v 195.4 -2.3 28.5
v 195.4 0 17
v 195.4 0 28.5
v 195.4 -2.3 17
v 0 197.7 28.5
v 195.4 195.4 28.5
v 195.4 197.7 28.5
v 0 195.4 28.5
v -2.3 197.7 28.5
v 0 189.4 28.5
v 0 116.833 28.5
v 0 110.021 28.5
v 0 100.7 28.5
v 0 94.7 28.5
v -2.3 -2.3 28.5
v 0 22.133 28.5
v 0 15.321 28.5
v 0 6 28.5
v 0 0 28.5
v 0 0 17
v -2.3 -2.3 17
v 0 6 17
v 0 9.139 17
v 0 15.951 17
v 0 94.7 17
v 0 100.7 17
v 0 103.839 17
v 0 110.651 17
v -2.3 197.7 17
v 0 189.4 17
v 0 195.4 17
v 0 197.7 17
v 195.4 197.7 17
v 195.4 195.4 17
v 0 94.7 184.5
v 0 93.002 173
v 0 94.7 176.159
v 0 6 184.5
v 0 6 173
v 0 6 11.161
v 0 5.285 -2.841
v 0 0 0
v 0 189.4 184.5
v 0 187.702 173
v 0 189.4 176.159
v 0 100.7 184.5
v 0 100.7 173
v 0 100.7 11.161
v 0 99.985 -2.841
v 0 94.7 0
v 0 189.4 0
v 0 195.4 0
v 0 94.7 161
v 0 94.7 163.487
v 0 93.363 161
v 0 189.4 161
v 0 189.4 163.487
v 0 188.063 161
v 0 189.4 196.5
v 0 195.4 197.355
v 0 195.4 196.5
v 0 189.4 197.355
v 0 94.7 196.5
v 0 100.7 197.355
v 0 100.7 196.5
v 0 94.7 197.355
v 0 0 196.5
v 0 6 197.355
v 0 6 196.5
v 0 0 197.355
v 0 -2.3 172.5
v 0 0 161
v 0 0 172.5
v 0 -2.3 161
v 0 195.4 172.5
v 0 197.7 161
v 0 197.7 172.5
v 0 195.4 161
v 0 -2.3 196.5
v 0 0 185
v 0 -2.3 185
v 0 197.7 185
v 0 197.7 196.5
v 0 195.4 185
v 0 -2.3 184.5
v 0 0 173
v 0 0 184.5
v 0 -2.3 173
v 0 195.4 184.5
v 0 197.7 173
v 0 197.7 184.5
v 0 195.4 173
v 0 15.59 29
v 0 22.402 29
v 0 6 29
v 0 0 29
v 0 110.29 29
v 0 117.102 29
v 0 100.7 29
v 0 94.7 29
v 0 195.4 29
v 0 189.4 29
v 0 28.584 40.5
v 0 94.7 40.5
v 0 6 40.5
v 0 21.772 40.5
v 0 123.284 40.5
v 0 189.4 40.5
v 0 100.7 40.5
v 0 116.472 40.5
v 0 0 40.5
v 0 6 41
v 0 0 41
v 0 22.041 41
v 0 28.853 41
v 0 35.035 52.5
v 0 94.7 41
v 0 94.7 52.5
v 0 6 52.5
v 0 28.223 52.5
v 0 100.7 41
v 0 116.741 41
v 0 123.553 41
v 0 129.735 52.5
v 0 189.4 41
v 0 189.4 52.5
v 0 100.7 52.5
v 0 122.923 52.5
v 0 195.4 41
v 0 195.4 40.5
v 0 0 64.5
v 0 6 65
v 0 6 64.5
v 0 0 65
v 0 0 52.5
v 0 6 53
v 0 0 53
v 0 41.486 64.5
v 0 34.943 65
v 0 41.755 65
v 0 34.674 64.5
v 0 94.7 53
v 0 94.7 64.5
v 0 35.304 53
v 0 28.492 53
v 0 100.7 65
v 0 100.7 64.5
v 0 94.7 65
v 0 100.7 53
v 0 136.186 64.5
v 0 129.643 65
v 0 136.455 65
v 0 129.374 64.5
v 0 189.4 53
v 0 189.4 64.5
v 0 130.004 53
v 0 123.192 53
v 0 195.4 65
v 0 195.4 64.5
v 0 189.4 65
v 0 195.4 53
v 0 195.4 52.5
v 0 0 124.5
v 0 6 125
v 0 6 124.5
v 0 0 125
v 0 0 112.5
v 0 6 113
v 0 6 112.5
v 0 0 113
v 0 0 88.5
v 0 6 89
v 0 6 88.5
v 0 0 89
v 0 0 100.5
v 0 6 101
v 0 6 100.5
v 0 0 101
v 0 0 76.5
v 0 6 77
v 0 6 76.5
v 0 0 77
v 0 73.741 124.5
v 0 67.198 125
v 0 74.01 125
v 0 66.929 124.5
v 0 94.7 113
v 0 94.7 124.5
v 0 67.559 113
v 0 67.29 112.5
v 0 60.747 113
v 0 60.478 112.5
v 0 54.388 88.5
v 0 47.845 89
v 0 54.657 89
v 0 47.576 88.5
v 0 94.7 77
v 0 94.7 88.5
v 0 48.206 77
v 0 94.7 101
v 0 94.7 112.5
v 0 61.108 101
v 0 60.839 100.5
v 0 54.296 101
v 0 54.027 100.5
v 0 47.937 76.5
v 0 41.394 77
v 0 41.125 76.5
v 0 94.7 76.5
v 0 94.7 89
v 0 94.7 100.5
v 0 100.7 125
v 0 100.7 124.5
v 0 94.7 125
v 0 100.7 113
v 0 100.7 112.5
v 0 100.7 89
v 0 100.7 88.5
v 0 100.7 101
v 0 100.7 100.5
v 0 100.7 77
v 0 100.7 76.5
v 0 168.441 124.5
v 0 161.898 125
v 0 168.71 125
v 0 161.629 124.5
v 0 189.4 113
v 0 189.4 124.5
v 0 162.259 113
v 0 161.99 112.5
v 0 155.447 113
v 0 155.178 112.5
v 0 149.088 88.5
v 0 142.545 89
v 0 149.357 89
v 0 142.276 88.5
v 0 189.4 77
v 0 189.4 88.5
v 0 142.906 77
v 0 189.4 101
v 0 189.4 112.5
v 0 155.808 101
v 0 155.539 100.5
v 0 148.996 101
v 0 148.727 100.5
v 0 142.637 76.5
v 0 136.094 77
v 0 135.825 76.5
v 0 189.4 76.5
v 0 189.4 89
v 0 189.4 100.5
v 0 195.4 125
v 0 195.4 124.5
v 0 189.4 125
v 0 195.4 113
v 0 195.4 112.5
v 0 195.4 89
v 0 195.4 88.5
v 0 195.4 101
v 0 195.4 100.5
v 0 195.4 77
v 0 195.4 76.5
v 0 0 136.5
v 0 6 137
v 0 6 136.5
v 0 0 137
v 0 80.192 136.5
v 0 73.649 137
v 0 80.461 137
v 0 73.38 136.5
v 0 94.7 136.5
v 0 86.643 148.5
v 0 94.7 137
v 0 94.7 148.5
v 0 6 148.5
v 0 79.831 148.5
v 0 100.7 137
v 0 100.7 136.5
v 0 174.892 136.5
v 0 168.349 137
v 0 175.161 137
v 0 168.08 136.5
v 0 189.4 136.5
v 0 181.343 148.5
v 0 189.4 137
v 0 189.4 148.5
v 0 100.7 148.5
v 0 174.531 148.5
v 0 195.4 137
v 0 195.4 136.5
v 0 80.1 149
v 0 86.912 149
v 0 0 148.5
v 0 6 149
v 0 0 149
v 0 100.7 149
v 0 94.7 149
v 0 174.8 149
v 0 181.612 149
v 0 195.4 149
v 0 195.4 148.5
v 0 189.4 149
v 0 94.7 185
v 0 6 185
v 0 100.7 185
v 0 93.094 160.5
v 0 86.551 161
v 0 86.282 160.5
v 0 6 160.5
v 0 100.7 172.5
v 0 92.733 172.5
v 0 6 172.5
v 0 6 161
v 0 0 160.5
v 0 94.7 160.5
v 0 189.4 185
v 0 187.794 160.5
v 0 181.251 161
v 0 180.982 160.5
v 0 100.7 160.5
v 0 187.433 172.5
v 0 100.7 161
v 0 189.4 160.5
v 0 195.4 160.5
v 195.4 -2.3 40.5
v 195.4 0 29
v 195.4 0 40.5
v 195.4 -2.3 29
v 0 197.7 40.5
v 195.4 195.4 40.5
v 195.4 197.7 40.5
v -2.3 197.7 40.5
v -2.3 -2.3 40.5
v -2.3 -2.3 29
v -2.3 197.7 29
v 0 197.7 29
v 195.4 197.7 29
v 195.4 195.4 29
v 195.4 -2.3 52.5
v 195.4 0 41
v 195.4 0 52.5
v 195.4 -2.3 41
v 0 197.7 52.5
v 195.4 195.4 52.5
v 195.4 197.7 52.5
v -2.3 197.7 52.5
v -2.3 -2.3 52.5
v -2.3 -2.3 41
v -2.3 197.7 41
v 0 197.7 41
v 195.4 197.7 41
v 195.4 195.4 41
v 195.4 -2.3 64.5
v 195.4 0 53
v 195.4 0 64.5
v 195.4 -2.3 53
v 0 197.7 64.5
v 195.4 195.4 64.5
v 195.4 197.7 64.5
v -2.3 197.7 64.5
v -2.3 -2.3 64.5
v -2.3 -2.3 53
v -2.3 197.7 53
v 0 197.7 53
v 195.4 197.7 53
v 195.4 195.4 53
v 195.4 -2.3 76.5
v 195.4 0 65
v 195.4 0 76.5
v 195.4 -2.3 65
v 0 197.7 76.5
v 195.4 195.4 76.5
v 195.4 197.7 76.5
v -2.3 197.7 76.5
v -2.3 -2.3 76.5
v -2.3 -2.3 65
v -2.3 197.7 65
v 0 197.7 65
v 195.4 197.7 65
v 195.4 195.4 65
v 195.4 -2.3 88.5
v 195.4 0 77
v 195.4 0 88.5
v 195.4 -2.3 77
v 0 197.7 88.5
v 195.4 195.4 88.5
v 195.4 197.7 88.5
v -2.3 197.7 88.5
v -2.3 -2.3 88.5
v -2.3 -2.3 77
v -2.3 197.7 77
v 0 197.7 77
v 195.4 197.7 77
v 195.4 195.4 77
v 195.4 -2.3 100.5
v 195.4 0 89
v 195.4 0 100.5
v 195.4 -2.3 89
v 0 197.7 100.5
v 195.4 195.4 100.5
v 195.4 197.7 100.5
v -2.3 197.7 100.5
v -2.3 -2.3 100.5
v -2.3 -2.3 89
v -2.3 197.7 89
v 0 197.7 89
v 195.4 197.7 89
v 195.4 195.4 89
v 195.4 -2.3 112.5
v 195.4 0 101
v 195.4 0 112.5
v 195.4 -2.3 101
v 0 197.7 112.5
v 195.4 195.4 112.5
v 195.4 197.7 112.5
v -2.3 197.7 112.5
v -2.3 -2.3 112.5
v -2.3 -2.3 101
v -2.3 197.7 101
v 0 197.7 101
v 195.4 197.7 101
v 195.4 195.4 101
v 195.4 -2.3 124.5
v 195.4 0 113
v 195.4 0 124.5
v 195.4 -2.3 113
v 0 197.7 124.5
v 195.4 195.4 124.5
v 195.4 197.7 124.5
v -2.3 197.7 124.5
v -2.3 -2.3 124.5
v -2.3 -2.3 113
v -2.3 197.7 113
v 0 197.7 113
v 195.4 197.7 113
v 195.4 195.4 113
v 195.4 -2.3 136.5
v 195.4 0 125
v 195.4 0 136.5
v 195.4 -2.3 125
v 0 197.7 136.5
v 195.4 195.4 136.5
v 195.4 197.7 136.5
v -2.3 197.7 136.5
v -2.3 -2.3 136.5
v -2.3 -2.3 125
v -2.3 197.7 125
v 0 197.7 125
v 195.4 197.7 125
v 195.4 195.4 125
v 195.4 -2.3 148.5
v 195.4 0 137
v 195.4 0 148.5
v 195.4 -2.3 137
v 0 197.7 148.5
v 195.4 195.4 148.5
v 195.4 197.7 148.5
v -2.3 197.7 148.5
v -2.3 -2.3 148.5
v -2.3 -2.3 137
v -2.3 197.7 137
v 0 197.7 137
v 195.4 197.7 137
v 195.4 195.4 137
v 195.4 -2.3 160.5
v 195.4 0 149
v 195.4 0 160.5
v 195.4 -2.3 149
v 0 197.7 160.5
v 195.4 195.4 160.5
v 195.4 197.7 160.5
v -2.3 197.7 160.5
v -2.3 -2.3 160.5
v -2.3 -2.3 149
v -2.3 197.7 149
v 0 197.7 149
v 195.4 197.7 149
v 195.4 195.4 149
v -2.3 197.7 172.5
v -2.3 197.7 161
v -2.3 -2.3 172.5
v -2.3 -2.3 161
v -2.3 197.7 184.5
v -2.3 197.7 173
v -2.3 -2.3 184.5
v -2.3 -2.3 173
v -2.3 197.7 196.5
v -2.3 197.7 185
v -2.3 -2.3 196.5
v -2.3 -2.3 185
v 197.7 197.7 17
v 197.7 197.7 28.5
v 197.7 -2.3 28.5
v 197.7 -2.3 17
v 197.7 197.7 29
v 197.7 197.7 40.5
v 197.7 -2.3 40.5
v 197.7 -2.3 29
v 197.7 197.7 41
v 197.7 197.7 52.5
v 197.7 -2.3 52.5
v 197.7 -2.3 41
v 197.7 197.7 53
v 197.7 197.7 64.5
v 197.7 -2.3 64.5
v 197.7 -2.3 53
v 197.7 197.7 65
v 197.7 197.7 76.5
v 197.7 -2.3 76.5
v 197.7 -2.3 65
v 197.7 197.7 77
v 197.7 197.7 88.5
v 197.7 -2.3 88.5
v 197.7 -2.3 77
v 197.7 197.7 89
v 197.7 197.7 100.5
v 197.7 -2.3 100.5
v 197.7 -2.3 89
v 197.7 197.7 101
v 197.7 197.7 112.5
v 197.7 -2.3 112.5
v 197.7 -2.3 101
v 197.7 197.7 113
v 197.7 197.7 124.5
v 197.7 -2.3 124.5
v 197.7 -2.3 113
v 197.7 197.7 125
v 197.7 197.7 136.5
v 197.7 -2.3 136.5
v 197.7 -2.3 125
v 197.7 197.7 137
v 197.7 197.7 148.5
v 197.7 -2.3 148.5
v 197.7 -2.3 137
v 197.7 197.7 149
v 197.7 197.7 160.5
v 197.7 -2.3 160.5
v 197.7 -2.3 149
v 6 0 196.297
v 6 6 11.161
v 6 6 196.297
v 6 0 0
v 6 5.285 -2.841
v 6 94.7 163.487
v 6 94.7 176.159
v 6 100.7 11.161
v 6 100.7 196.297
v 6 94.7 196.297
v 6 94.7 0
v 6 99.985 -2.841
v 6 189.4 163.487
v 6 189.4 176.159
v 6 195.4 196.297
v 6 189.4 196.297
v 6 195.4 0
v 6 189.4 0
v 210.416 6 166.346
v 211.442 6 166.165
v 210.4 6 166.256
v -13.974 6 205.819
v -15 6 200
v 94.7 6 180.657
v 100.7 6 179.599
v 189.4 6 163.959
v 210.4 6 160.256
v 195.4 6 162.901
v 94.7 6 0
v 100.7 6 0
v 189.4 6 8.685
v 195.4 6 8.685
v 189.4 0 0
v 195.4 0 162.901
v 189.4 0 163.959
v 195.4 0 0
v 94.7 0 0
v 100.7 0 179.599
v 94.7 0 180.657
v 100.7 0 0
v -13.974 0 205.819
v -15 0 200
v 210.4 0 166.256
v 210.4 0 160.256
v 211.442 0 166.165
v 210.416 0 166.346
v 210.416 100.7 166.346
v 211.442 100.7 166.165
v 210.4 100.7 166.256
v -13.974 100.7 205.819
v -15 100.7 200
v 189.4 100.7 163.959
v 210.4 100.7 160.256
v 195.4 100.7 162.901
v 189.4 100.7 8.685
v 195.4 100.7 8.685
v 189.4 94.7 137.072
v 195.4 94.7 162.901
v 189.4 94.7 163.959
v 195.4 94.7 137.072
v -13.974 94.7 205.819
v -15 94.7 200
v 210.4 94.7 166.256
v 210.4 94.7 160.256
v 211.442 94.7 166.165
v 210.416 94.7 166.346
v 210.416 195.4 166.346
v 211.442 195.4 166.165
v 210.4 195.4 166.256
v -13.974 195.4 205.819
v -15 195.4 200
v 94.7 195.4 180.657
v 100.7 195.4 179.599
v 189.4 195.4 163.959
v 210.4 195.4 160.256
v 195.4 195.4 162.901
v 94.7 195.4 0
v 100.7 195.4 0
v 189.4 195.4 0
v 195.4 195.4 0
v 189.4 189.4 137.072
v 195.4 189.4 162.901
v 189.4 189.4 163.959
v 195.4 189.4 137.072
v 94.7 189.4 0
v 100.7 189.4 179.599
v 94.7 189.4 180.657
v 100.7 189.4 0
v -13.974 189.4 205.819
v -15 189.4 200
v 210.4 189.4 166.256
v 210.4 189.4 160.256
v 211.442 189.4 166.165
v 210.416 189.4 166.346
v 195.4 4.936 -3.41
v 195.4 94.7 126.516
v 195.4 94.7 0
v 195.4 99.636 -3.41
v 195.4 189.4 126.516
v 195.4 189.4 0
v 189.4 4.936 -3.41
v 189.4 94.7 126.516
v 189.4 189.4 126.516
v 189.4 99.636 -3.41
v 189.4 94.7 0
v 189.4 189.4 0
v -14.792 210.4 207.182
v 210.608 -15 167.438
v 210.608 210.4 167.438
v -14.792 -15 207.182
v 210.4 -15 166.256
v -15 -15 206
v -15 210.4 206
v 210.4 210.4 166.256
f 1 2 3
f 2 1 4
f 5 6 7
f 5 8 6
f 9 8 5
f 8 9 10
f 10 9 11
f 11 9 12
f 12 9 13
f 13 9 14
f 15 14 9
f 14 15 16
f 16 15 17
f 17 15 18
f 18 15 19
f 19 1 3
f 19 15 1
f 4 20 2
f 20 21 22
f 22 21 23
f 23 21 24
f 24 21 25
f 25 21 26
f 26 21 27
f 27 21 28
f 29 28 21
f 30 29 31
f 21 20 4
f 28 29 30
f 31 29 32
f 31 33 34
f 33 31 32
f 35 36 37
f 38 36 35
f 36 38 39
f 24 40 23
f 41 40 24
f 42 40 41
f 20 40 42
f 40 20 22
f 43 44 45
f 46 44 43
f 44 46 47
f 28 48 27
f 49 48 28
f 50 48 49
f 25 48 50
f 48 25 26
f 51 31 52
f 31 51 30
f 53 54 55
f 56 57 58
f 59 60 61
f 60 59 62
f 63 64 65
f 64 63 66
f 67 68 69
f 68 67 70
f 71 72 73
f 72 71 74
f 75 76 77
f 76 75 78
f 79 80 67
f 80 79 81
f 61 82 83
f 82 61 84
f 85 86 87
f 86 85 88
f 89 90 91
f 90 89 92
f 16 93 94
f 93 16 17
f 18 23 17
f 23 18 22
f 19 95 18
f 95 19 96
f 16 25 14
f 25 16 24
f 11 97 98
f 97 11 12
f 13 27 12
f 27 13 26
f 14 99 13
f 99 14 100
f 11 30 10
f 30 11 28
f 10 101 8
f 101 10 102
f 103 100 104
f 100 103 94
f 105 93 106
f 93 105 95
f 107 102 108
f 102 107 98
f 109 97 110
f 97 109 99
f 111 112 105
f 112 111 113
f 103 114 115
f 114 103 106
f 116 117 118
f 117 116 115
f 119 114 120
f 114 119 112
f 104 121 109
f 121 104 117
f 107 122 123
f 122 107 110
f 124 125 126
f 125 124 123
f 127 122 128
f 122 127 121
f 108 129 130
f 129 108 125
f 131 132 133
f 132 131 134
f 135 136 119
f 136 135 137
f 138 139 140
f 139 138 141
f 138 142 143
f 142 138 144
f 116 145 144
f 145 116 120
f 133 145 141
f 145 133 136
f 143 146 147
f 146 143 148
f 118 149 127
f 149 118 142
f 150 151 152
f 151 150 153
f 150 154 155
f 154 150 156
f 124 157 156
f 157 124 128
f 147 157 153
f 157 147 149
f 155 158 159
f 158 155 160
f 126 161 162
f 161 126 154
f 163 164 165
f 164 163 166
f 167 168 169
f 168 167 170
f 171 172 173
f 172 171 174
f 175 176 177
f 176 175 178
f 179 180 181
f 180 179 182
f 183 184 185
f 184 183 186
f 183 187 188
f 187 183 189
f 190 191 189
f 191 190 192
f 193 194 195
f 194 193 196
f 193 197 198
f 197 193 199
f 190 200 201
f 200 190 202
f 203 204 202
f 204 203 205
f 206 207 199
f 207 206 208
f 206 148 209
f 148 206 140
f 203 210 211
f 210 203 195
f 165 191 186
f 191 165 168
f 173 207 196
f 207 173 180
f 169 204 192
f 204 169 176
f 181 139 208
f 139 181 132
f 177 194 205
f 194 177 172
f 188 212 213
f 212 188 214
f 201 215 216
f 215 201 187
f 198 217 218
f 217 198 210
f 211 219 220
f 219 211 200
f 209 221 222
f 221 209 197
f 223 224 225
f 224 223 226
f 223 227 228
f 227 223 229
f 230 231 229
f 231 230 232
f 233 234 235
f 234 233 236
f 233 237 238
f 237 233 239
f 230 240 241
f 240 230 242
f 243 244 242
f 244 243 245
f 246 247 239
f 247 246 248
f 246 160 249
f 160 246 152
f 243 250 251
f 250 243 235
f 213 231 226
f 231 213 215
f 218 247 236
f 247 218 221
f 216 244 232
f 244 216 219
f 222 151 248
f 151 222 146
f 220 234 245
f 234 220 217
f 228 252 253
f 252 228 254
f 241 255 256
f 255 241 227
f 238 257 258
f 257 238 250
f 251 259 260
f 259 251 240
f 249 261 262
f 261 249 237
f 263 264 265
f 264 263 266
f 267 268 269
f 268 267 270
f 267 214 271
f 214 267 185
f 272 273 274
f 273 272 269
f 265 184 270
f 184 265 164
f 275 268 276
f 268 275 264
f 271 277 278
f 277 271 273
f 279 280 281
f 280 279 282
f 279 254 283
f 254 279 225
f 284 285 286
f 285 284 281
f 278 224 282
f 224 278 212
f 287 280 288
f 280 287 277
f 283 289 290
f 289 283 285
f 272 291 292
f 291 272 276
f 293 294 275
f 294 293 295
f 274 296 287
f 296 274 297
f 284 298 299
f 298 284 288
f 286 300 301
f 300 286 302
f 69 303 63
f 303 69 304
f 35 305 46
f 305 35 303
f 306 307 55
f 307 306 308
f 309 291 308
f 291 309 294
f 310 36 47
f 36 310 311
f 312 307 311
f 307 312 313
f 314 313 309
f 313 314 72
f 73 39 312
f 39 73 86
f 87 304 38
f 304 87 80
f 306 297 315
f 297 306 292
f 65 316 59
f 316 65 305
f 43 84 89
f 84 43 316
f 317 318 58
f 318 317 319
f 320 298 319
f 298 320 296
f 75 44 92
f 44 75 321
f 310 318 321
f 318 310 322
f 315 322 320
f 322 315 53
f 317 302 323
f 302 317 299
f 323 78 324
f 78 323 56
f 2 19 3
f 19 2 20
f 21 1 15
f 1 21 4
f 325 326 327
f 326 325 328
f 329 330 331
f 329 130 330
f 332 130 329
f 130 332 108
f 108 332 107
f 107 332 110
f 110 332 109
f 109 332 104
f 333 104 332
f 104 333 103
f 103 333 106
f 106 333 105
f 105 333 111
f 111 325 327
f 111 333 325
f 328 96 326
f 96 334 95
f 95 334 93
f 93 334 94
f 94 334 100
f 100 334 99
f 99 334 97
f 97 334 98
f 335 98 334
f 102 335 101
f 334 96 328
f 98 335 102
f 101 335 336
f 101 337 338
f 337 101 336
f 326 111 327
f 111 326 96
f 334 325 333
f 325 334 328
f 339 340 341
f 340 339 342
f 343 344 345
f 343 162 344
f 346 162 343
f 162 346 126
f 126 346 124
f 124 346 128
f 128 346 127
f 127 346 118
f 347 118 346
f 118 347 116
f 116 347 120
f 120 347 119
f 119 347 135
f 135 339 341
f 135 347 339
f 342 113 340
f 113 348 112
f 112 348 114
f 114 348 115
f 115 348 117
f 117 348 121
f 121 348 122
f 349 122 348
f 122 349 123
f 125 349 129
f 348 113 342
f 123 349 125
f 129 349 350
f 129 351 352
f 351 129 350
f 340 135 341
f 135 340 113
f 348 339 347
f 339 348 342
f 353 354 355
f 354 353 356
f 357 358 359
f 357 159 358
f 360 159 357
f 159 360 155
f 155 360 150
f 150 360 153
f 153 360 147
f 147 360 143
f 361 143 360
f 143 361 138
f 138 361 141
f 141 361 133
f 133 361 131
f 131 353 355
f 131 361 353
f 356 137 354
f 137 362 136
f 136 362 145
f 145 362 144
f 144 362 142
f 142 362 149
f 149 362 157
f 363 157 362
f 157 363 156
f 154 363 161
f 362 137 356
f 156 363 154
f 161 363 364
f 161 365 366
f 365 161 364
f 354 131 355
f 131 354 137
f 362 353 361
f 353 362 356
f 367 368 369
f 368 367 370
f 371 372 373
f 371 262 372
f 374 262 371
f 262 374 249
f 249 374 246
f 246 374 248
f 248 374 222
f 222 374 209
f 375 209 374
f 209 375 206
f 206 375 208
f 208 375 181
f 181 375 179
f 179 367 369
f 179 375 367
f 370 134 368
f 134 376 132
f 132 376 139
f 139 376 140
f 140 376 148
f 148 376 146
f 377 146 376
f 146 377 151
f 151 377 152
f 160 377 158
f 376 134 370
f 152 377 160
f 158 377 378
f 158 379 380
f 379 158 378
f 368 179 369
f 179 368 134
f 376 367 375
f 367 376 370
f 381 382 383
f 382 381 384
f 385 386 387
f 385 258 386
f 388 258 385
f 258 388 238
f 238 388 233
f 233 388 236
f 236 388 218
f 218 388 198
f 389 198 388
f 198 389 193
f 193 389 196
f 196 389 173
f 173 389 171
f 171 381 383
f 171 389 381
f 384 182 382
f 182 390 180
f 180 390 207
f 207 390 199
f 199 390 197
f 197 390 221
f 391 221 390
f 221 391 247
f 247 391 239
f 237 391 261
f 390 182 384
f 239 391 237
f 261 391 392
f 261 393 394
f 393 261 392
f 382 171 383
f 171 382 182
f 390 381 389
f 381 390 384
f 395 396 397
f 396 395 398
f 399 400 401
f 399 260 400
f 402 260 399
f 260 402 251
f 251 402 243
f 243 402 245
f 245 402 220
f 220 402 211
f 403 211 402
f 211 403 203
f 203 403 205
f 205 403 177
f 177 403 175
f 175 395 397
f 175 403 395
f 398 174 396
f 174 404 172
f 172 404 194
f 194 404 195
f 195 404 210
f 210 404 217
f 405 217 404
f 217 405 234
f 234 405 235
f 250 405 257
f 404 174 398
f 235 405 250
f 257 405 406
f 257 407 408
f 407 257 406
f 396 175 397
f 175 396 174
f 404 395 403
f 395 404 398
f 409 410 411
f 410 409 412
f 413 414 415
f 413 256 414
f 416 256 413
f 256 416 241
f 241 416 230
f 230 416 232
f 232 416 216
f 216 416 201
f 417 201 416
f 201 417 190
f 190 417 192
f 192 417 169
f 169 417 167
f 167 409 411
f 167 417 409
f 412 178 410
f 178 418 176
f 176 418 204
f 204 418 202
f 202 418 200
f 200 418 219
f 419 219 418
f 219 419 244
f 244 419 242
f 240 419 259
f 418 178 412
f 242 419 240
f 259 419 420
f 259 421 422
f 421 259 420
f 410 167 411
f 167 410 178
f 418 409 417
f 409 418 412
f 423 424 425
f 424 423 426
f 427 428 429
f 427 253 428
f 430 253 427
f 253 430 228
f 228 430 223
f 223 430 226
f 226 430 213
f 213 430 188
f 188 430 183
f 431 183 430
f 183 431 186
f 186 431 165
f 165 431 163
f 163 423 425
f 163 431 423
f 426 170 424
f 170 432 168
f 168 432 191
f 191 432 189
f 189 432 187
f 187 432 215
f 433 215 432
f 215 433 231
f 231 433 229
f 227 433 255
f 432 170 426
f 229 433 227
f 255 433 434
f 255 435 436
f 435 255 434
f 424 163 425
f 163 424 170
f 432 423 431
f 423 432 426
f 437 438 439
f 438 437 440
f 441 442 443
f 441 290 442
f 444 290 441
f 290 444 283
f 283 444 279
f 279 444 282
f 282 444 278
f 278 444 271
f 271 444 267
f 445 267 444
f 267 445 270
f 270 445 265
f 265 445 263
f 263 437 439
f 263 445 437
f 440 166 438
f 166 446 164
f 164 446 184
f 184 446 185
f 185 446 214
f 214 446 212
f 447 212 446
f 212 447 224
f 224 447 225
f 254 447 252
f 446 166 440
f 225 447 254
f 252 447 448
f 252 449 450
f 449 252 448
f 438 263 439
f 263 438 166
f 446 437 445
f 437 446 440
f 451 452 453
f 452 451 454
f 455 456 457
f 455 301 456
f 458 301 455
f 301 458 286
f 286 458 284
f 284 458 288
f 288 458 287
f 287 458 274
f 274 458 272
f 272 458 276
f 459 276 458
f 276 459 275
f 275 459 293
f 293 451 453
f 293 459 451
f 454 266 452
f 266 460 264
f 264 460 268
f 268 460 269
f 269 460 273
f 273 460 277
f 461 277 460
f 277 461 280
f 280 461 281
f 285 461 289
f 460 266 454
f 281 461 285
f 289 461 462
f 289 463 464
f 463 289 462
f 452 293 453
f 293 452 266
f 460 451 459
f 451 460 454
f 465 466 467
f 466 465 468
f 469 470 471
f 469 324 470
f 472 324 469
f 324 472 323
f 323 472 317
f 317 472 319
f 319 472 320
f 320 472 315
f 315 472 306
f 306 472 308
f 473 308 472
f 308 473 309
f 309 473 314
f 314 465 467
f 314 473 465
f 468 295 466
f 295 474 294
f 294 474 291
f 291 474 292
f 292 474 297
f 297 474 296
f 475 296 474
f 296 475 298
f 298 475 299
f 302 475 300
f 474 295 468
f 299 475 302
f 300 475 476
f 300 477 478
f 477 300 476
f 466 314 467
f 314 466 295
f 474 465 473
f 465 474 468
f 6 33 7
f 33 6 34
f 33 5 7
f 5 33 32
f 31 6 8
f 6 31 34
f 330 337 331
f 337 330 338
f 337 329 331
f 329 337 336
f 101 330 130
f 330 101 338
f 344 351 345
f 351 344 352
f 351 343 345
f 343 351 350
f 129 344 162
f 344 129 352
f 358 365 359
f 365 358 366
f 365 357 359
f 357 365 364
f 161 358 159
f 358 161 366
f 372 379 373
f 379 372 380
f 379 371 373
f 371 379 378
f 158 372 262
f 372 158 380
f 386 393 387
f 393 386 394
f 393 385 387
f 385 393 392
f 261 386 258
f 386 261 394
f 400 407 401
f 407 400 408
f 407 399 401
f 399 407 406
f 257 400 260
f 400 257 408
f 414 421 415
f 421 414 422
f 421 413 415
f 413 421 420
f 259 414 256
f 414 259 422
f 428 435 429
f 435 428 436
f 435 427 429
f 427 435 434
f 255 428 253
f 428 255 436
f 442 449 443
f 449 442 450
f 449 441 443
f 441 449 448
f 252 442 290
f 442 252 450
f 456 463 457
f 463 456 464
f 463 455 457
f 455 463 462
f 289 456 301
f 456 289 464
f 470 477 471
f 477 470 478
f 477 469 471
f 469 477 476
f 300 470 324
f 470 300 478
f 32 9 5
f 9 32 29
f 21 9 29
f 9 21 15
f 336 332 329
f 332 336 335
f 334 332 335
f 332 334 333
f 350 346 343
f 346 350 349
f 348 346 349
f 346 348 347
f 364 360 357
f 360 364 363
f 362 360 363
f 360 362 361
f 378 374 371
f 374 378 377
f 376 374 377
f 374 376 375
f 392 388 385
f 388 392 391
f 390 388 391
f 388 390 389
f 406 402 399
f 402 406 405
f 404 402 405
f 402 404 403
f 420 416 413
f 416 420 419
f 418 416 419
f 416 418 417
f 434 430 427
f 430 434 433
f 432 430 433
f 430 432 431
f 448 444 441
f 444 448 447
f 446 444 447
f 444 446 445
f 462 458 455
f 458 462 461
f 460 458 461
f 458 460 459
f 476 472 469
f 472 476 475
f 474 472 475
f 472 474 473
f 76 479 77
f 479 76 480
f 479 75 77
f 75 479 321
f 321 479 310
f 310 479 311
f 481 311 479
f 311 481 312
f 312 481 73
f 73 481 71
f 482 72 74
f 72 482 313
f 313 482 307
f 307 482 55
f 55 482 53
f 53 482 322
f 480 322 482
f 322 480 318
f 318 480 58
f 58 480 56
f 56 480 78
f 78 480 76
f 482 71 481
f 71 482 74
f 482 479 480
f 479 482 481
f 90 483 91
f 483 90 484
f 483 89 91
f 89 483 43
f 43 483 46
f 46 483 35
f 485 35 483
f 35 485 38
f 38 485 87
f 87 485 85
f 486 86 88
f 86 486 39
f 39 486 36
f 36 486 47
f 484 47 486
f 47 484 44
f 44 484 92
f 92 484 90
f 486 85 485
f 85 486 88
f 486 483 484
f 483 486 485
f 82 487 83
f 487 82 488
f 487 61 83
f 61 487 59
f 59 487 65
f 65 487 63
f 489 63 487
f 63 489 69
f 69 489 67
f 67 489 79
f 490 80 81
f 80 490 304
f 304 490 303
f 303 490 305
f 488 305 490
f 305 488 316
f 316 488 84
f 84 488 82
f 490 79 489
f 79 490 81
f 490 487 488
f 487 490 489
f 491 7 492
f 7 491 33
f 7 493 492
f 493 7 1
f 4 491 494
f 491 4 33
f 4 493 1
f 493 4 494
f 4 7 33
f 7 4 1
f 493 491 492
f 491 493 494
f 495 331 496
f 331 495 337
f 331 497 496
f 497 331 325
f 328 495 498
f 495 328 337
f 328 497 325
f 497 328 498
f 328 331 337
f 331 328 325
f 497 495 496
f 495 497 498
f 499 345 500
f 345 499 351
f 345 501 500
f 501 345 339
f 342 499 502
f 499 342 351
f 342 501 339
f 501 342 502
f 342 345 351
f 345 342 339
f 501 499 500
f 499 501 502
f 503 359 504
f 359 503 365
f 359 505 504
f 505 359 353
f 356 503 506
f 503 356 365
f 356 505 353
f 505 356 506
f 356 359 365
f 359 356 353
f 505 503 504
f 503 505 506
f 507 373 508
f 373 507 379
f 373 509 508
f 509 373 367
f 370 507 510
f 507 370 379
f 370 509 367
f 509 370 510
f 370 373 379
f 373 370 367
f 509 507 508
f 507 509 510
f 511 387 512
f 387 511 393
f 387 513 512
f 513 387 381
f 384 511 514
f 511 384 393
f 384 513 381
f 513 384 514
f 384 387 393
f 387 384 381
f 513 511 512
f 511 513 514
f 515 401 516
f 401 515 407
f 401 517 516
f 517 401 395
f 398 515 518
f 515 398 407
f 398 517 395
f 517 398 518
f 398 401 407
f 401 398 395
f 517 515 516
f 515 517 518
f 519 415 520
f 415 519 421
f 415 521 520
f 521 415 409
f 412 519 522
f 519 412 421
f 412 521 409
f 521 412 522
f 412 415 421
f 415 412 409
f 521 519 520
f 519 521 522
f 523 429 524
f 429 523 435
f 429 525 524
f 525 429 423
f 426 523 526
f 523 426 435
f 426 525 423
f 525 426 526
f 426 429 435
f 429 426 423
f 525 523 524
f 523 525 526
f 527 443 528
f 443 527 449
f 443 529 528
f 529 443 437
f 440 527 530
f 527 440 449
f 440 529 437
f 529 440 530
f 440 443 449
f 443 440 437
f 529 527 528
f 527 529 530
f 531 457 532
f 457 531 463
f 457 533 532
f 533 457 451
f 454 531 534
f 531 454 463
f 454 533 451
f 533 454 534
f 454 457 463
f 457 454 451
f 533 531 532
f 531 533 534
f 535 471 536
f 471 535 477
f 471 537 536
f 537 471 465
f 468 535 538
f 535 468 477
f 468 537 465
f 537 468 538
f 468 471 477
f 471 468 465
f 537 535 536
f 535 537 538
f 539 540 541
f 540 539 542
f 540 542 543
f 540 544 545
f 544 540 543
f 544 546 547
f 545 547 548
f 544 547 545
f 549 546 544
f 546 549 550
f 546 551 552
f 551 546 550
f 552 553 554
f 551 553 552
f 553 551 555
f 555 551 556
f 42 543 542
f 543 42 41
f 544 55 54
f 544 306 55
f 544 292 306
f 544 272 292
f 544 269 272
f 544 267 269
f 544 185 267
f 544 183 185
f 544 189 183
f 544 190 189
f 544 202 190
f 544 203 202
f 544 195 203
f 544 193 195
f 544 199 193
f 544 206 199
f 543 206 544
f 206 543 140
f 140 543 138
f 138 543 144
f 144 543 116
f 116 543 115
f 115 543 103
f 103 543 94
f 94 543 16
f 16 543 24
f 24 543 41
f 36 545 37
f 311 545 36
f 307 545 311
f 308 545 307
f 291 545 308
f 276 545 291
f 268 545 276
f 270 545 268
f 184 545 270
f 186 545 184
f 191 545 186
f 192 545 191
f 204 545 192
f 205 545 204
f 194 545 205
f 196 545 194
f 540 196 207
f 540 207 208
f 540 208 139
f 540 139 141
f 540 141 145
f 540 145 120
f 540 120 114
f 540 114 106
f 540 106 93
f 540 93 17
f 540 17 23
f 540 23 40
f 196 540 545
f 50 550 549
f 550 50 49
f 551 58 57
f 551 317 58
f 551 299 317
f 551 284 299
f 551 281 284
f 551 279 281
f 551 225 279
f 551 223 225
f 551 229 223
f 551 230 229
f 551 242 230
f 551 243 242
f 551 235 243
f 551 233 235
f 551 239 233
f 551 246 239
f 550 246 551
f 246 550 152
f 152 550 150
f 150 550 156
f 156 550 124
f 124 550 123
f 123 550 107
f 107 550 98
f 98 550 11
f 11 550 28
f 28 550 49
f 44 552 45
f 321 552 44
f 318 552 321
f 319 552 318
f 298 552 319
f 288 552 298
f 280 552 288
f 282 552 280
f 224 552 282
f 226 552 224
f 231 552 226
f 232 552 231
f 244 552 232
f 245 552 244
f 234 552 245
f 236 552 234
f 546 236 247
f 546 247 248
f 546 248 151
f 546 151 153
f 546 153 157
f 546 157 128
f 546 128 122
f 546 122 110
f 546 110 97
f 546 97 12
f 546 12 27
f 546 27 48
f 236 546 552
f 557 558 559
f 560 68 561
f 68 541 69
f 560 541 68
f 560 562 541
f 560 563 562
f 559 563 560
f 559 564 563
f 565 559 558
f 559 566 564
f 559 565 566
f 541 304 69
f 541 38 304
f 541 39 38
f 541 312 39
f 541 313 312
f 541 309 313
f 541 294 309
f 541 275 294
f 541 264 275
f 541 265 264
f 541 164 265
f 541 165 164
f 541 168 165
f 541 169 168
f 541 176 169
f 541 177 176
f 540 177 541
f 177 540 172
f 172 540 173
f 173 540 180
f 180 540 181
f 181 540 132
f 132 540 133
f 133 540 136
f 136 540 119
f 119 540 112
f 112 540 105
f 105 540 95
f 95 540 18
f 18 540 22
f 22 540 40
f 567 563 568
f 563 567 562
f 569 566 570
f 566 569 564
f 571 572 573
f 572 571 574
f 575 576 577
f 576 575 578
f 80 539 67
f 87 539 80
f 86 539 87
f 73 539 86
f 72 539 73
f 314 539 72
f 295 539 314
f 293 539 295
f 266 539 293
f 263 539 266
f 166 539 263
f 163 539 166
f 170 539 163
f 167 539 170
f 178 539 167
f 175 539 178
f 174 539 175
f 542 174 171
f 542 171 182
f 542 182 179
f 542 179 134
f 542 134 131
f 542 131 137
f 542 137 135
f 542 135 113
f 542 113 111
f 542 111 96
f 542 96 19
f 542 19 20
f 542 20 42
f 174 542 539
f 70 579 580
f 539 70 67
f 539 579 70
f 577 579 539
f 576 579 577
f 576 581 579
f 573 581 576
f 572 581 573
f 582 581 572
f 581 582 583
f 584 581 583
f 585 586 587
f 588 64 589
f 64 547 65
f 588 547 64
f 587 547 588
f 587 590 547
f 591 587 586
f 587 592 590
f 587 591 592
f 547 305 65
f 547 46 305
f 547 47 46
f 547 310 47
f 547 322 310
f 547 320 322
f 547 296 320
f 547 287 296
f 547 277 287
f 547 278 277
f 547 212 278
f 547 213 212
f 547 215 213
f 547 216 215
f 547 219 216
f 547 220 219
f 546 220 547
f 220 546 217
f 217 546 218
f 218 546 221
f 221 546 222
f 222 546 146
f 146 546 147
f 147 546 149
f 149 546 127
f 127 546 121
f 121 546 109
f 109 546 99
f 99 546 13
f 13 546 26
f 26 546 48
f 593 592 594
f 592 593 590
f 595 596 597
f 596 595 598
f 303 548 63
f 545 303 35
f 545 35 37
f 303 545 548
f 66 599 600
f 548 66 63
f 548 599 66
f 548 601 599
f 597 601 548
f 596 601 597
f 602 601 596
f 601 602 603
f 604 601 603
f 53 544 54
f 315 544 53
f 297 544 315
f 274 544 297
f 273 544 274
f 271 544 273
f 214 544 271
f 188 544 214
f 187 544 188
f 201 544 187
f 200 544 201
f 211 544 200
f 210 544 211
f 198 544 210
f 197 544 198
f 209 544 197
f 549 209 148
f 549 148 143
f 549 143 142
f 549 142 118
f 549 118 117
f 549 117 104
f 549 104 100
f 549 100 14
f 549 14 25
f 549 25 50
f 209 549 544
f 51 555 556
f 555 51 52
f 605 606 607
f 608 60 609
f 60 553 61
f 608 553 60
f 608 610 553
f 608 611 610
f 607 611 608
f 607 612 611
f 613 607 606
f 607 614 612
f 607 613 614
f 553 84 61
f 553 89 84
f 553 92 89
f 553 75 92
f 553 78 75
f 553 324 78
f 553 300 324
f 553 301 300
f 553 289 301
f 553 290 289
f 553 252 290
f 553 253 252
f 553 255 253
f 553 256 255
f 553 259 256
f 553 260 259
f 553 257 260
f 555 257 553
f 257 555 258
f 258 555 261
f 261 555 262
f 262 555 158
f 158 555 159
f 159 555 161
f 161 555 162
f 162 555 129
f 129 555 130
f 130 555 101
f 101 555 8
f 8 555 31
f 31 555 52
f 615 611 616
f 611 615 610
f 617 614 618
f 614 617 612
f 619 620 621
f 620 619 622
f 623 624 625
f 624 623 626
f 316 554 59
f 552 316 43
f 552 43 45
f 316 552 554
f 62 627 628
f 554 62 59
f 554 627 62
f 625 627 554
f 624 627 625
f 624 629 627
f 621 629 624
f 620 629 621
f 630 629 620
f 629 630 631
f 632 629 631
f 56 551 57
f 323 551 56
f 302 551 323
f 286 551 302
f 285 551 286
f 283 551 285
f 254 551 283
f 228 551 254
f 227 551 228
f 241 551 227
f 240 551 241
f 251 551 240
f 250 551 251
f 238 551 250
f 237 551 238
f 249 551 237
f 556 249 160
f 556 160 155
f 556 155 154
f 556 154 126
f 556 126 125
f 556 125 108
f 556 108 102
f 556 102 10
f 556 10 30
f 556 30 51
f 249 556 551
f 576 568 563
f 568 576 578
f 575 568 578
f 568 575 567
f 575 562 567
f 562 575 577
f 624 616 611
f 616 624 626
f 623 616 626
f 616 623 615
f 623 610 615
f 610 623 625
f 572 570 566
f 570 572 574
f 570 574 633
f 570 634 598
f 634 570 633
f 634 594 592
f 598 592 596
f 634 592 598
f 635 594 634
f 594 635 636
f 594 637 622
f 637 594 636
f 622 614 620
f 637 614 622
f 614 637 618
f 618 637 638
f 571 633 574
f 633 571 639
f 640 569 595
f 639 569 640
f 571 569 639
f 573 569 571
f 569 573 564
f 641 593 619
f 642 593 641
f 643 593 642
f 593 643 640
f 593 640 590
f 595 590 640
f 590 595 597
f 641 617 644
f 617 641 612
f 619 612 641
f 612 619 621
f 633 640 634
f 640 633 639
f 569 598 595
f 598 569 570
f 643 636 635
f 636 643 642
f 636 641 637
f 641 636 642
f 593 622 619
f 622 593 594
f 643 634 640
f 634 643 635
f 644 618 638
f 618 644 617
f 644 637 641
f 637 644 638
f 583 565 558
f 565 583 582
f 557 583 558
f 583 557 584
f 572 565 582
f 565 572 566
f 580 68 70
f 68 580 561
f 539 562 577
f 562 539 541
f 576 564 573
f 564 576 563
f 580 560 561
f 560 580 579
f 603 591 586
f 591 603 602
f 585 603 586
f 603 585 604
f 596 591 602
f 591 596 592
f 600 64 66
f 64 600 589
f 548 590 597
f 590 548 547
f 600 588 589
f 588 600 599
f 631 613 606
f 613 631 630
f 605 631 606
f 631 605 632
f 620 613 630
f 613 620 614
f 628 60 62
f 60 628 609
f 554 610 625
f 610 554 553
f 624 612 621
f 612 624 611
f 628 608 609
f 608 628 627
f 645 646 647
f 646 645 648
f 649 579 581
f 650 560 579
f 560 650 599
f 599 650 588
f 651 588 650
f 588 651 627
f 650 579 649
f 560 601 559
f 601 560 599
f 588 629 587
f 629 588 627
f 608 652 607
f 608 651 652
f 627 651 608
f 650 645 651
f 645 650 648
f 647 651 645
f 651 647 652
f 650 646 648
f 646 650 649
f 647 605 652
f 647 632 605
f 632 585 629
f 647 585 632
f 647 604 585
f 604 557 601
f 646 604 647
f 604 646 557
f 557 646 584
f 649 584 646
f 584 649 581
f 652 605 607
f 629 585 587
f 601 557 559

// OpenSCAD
height = 200;
depth = 195.4;
width = 195.4;

roofOverlap = 15;
roofAngle = 10;

beamCountWidth = 3;
beamCountDepth = 3;
beamWidth = 6;
beamDepth = 6;

boardHeight = 11.5;
boardThickness = 2.3;
boardSpacing = 0.5;

plateWidth = 62.5;
plateHeight = 1.2;

widthMinOne = width - beamWidth;
depthMinOne = depth - beamDepth;

beamSpacing = depthMinOne / (beamCountDepth - 1);

blankBeamBottomHeight = 17;

useActualWallHeight = true;

// einschlaghülse: 10.95€
// beam: 6.4€
// board: 5€
// coating: 81.95€
// roof plate: 9.67€
// price = 8 * 10.95 + 15 * 6.4 + 60 * 5 + 81.95 + 4 * 9.67 = 604.23



// beams
module beamRow(placeMiddle, beamHeight) {
    for(y = [0 : beamSpacing : depthMinOne]) {
        if(placeMiddle || y == 0 || y == depthMinOne) {
            echo("BEAM", beamWidth, beamDepth, beamHeight);
            translate([0, y, 0])
                cube([beamWidth, beamDepth, beamHeight]);
        }
    }
}
// diagonal beams for stability
module stabilityBeam(beamHeight) {
    for(y = [0 : beamSpacing : depthMinOne - 1]) {
        stabilityBeamAngle = -1 * asin(beamSpacing / beamHeight);
        echo("STABILITY BEAM", stabilityBeamAngle, beamHeight, beamDepth, beamWidth);
        translate([0, y, 0])
            rotate([stabilityBeamAngle, 0, 0])
                cube([beamDepth, beamWidth, beamHeight]);
    }
}
module beams() {
    for(x = [0 : beamSpacing : widthMinOne]) {
        beamHeight = height - x * tan(roofAngle);
        translate([x, 0, 0])
            union() {
                if(x == 0 || x == widthMinOne) {
                    stabilityBeam(beamHeight);
                }
                beamRow(x == 0 || x == widthMinOne, beamHeight);
            }
    }
}

module roof(enablePrint = false) {
    roofLength = (width + 2 * roofOverlap) / cos(roofAngle);

    // roof beams
    for(y = [0 : beamSpacing : depthMinOne]) {
        if(enablePrint) {
            echo("ROOF BEAM", roofLength, beamDepth, beamWidth);
        }
        translate([-roofOverlap, y, height])
            rotate([0, roofAngle, 0])
                cube([roofLength, beamDepth, beamWidth]);
    }

    // roof plates
    translate([-roofOverlap, -roofOverlap, height + beamWidth])
        rotate([0, roofAngle, 0])
            union() {
                for(x = [0 : plateWidth : roofLength]) {
                    actualWidth = x + plateWidth > roofLength ? roofLength - x : plateWidth;
                    if(enablePrint) {
                        echo("ROOF PLATE", actualWidth, depth + 2 * roofOverlap, plateHeight);
                    }
                    translate([x, 0, 0])
                        cube([actualWidth, depth + 2 * roofOverlap, plateHeight]);
                }
            }
}

//wall 
module wall(width, wallHeight) {
    usedWallHeight = useActualWallHeight ? wallHeight - boardHeight : height;
    for(z = [blankBeamBottomHeight : boardHeight + boardSpacing : usedWallHeight]) {
        echo("WALL BOARD", width, boardThickness, boardHeight);
        translate([0, 0, z])
            cube([width, boardThickness, boardHeight]);
    }
}

// all walls
union() {
    translate([0, -boardThickness, 0])
        wall(depth, height - widthMinOne * tan(roofAngle));

    translate([0, depth, 0])
        wall(depth, height - widthMinOne * tan(roofAngle));

    translate([0, -boardThickness, 0])
        rotate([0, 0, 90])
            wall(depth + 2 * boardThickness, height);

    translate([width + boardThickness, -boardThickness, 0])
        rotate([0, 0, 90])
            wall(depth + 2 * boardThickness, height - widthMinOne * tan(roofAngle));
}

difference() {
    beams();
    roof();
}

roof(true);
